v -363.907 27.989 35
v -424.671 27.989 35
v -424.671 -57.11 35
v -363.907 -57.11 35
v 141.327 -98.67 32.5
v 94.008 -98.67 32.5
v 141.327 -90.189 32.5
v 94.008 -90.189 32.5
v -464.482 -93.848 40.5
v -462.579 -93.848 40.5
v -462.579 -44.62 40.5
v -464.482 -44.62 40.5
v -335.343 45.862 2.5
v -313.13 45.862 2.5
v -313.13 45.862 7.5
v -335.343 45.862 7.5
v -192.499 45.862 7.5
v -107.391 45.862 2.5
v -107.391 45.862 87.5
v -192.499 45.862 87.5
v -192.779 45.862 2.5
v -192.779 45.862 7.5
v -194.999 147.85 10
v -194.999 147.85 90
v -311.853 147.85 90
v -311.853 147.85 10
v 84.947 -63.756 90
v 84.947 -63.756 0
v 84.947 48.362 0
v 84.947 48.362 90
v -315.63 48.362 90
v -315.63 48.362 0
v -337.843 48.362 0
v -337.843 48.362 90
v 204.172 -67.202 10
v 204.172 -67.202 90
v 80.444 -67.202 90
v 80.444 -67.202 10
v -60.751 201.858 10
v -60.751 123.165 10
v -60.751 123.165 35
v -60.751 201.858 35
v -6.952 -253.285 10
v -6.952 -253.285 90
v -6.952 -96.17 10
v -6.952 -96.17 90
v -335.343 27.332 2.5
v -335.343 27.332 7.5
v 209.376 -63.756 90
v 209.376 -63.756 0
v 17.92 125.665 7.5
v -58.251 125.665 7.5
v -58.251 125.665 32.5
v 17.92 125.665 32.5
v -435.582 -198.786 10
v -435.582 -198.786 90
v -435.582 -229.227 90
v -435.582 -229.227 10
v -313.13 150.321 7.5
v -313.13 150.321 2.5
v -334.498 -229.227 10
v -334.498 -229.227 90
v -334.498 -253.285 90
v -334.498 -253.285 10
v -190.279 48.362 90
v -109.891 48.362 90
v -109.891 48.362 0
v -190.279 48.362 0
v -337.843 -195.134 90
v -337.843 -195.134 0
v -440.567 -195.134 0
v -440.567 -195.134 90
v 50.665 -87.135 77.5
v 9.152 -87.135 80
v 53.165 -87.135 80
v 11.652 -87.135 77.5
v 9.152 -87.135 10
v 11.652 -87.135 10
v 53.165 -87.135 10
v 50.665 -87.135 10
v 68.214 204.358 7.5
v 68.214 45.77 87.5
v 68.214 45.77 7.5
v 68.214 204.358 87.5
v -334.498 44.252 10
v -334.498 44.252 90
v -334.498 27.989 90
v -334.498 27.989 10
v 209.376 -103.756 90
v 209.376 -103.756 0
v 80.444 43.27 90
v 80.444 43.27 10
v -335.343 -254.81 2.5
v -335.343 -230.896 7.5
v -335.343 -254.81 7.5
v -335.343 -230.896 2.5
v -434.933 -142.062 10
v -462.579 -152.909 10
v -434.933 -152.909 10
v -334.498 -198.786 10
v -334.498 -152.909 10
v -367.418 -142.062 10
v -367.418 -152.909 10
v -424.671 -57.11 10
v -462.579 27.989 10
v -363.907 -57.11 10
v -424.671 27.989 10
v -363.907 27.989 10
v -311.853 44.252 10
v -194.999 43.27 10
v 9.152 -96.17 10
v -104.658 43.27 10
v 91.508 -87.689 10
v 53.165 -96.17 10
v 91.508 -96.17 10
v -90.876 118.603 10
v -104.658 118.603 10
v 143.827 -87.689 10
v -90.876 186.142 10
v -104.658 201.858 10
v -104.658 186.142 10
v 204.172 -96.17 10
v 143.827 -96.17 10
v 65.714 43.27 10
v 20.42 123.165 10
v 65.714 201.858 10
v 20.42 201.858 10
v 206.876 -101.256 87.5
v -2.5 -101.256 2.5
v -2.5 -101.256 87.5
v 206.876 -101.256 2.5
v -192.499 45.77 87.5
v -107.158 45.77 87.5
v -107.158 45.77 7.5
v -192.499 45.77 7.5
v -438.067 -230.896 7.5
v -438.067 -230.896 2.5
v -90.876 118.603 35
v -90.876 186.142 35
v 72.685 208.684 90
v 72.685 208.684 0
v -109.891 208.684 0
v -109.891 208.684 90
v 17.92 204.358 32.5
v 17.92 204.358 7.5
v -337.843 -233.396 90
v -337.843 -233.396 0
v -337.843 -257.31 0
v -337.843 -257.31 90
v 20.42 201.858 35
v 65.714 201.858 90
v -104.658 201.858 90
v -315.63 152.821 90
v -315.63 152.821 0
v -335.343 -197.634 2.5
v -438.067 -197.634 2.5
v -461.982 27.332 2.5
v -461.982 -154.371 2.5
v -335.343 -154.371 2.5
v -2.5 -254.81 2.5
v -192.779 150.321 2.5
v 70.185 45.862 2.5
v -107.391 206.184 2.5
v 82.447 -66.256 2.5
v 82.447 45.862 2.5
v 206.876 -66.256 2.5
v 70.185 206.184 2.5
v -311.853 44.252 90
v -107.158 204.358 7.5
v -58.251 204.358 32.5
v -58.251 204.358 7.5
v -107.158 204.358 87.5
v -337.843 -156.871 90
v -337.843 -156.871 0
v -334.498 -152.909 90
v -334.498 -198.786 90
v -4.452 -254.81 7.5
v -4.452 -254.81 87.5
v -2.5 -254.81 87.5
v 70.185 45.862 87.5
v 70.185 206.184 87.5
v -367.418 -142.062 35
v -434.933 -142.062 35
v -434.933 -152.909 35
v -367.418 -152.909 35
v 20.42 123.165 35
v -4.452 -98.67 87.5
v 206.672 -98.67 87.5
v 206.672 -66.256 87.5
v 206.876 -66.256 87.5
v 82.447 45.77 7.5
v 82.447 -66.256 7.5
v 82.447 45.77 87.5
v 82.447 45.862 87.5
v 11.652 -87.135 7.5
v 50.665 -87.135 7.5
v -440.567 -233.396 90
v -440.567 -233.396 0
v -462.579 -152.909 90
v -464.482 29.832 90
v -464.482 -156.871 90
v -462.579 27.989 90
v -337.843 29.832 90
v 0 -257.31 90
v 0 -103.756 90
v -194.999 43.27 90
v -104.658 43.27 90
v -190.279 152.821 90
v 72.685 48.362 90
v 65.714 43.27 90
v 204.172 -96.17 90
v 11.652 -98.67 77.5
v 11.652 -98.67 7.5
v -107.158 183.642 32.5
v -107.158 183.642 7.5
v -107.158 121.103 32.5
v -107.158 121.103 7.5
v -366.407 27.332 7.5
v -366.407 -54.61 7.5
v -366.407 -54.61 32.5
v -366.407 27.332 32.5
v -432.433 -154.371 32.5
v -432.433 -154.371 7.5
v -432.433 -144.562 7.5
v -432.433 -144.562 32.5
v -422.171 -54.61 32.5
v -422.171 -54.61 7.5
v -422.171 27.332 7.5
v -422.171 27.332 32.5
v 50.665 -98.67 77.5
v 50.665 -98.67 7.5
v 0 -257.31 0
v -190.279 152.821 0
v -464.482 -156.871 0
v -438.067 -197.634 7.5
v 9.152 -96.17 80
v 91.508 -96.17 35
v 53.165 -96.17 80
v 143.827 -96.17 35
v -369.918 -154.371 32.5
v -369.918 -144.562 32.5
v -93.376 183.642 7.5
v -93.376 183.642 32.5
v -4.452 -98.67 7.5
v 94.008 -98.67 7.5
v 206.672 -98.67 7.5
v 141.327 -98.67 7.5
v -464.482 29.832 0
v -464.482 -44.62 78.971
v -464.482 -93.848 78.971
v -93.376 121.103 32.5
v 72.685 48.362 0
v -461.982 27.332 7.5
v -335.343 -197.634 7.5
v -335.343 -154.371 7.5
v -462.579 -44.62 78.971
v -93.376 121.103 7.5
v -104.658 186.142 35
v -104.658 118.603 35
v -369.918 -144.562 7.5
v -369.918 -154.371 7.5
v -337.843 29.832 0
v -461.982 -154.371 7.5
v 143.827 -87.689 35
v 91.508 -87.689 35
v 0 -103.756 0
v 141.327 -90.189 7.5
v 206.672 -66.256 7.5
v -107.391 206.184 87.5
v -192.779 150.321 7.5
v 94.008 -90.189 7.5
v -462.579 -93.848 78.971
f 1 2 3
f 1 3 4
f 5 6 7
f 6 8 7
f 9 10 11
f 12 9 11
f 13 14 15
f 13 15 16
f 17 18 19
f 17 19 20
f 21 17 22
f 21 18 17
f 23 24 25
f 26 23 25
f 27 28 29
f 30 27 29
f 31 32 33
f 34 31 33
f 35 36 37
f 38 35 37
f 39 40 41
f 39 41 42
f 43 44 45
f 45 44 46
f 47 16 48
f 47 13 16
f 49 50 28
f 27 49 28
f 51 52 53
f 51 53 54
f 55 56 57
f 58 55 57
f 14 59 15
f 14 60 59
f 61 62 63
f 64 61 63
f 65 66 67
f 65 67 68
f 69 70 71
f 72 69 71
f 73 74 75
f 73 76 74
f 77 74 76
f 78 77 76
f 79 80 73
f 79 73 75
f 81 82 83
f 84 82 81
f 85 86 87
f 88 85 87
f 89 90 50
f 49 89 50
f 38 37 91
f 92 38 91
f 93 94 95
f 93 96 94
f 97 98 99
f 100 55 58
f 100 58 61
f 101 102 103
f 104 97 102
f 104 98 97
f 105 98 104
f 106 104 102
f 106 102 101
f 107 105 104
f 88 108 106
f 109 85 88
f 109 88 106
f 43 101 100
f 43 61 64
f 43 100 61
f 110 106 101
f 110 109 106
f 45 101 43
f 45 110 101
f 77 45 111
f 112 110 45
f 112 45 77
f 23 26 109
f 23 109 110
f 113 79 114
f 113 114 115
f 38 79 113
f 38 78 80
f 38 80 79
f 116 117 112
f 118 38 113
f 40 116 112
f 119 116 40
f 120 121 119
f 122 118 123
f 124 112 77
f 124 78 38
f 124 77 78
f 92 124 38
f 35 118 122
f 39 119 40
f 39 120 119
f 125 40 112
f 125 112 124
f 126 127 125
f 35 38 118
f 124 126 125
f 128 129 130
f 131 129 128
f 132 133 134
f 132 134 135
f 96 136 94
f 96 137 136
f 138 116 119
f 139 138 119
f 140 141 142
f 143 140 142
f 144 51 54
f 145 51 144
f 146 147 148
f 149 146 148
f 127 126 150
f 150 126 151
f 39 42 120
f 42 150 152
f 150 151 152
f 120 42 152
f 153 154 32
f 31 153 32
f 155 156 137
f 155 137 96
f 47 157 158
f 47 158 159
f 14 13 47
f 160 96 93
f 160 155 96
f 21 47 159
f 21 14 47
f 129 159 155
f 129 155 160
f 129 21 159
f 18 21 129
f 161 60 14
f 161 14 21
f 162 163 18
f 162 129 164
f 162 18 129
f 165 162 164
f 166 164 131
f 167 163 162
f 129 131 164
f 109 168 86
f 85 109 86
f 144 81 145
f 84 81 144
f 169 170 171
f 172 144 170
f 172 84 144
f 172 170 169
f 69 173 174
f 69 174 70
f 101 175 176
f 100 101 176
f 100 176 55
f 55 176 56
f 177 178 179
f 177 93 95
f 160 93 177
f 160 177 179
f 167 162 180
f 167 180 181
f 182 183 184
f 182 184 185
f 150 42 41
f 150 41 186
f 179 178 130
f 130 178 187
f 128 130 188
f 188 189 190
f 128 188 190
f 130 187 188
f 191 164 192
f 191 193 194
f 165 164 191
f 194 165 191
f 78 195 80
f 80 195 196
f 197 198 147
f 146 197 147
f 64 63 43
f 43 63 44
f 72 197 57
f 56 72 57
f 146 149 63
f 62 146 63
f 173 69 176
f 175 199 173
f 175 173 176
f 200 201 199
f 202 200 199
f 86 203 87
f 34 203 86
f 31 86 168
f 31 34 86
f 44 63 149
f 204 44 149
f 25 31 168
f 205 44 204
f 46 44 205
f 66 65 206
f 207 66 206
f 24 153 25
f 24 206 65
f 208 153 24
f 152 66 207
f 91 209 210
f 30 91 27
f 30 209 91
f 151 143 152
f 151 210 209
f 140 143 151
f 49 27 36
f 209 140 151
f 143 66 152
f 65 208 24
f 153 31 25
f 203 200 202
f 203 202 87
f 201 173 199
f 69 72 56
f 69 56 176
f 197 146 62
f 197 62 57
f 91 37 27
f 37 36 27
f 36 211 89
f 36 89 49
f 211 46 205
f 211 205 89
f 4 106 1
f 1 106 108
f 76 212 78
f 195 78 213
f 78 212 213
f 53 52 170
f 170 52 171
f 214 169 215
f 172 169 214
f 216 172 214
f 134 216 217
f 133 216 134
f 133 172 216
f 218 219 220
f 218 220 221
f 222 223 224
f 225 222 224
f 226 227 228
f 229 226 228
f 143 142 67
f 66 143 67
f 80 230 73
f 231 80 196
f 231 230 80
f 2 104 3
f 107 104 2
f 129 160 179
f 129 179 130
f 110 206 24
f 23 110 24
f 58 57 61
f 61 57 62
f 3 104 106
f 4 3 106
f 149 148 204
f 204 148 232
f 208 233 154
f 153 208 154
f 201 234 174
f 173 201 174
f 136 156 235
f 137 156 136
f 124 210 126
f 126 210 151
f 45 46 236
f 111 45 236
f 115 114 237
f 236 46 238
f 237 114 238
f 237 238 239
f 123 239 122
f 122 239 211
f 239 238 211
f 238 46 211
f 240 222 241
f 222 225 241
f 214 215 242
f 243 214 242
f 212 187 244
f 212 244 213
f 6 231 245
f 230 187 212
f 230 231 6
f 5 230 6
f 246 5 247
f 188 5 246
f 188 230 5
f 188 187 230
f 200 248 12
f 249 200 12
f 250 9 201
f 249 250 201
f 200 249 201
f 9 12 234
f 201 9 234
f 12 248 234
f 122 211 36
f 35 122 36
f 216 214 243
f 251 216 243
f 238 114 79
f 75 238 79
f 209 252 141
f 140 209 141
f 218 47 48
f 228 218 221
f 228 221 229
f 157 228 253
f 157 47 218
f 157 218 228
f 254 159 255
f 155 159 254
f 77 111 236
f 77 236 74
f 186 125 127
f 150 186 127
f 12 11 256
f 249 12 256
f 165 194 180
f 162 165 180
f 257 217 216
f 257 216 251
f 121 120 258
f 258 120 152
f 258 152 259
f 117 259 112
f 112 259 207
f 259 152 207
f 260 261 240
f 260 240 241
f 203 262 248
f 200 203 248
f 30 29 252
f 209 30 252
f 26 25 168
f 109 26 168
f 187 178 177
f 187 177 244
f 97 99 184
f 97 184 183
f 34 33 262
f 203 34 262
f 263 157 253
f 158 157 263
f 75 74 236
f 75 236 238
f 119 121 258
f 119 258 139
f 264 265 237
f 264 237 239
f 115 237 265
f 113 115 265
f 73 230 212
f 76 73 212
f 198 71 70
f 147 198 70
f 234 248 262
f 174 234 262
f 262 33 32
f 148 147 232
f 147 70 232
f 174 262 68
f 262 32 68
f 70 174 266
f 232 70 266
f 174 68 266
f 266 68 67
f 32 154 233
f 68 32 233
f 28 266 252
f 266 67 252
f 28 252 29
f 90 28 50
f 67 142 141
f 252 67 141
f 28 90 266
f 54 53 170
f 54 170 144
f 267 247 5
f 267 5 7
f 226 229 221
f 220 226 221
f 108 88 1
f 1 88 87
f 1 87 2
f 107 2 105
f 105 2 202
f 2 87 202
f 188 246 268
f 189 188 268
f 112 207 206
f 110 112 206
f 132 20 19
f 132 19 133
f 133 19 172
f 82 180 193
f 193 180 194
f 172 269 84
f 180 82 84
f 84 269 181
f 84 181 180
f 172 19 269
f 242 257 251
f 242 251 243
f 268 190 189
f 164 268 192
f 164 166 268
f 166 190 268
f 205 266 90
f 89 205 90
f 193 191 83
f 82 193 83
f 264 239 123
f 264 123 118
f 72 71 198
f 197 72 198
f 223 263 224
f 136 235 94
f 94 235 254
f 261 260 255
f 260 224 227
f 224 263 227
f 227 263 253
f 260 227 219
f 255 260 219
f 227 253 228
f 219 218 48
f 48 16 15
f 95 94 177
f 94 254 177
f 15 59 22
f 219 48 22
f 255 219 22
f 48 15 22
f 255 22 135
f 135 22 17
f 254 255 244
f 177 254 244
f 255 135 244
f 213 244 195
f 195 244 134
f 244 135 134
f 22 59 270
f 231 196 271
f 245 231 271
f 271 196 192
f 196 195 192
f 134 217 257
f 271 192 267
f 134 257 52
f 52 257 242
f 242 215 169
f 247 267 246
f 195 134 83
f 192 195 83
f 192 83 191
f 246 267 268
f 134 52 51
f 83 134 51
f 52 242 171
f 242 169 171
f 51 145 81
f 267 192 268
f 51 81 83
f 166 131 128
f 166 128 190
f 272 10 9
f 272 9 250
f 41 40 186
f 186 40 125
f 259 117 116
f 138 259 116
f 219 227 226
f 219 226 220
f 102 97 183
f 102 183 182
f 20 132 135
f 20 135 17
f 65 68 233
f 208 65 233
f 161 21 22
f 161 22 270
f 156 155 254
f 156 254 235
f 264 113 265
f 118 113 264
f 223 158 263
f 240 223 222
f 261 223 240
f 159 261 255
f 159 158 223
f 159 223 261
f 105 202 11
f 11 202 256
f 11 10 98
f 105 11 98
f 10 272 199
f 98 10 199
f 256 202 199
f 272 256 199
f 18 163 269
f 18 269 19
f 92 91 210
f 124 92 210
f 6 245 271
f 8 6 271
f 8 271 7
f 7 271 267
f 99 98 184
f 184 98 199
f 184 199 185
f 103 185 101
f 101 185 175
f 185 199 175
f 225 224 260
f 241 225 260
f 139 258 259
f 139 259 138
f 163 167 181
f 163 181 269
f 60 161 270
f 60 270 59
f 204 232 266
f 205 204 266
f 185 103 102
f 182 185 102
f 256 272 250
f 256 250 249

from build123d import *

# Parameters (mm, degrees)
F1_DEPTH  = 90
F3_DEPTH  = 80
F14_W     = 60.7640445232
F14_H     = 85.0984491408
F14_W_2   = 67.515194416
F14_H_2   = 10.8465999365
F15_DEPTH = 25
F16_W     = 49.2283031344
F16_H     = 38.4706258774
F17_DEPTH = 25
F18_W     = 81.171695143
F18_H     = 78.6929726601
F18_W_2   = 13.7816295028
F18_H_2   = 67.5387531519
F19_DEPTH = 25
F20_W     = 44.0124189481
F20_H     = 9.0348646045
F21_DEPTH = 70
F22_W     = 52.3186028004
F22_H     = 8.4803402424
F23_DEPTH = 25
F24_T     = -2.5


# Not quite as in the source:
# - a shell that OpenCascade refuses in one call is made with other operations: the cavity is built on its own and cut out
# - the program builds the solid bodies; features that only make, move or delete a surface that nothing else refers to are left out


with BuildPart() as f1:
    # F0 (on Top) → F1 (new body)
    with BuildSketch(Plane.XY):
        Polygon((0, -103.756165579), (61.2453594729, -103.756165579), (209.3763612108, -103.756165579), (209.3763612108, -63.756165579), (84.9471986294, -63.756165579), (84.9471986294, 48.3620613813), (72.6846382022, 48.3620613813), (72.6846382022, 208.6838036776), (-109.8914146423, 208.6838036776), (-109.8914146423, 48.3620613813), (-190.279379487, 48.3620613813), (-190.279379487, 152.8209894896), (-315.6301081181, 152.8209894896), (-315.6301081181, 48.3620613813), (-337.8433585167, 48.3620613813), (-337.8433585167, 29.8324227333), (-464.4817113876, 29.8324227333), (-464.4817113876, -156.8707674742), (-337.8433585167, -156.8707674742), (-337.8433585167, -195.1335072517), (-440.5674934387, -195.1335072517), (-440.5674934387, -233.3962619305), (-337.8433585167, -233.3962619305), (-337.8433585167, -257.3104500771), (0, -257.3104500771), align=None)
    extrude(amount=F1_DEPTH)

    # F2 (on face) → F3 (cut)
    with BuildSketch(Plane.XY.offset(90)):
        Polygon((-334.4984054565, 27.9887765646), (-462.5793099403, 27.9887765646), (-462.5793099403, -152.908667922), (-334.4984054565, -152.908667922), (-334.4984054565, -198.7856328487), (-435.5817735195, -198.7856328487), (-435.5817735195, -229.2267084122), (-334.4984054565, -229.2267084122), (-334.4984054565, -253.2849907875), (-6.9517553784, -253.2849907875), (-6.9517553784, -96.1697399616), (204.1718363762, -96.1697399616), (204.1718363762, -67.2016069293), (80.44359833, -67.2016069293), (80.44359833, 43.2700514793), (65.7140463591, 43.2700514793), (65.7140463591, 201.8582522869), (-104.6577990055, 201.8582522869), (-104.6577990055, 43.2700552046), (-194.9990689754, 43.2700552046), (-194.9990689754, 147.8498876095), (-311.8534982204, 147.8498876095), (-311.8534982204, 44.2520268261), (-334.4984054565, 44.2520268261), align=None)
    extrude(amount=-F3_DEPTH, mode=Mode.SUBTRACT)

    # F14 (on face) → F15 (join)
    with BuildSketch(Plane.XY.offset(10)):
        with Locations((-394.2892104387, -14.5604480058)):
            Rectangle(F14_W, F14_H)
        with Locations((-401.1757969856, -147.4853679538)):
            Rectangle(F14_W_2, F14_H_2)
    extrude(amount=F15_DEPTH)

    # F16 (on face) → F17 (cut)
    with BuildSketch(Plane.YZ.offset(-462.5793099403)):
        with Locations((-69.2342929542, 59.7355216742)):
            Rectangle(F16_W, F16_H)
    extrude(amount=-F17_DEPTH, mode=Mode.SUBTRACT)

    # F18 (on face) → F19 (join)
    with BuildSketch(Plane.XY.offset(10)):
        with Locations((-20.1654676348, 162.5117659569)):
            Rectangle(F18_W, F18_H)
        with Locations((-97.7669842541, 152.3723676801)):
            Rectangle(F18_W_2, F18_H_2)
    extrude(amount=F19_DEPTH)

    # F20 (on face) → F21 (join)
    with BuildSketch(Plane.XY.offset(10)):
        with Locations((31.1586786993, -91.6523076594)):
            Rectangle(F20_W, F20_H)
    extrude(amount=F21_DEPTH)

    # F22 (on face) → F23 (join)
    with BuildSketch(Plane.XY.offset(10)):
        with Locations((117.6677644253, -91.9295698404)):
            Rectangle(F22_W, F22_H)
    extrude(amount=F23_DEPTH)

    # F24: a shell. OpenCascade refuses it in one call, so the cavity is built on its own and cut out:
    # the body offset inwards by the wall thickness, plus a prism from it out through each open face.
    f24_core = offset(f1.part, amount=F24_T, kind=Kind.INTERSECTION, mode=Mode.PRIVATE)
    f24_exits = [f24_core.faces().sort_by_distance(p)[0] for p in [
        (31.158679, -89.634875, 42.5),
    ]]
    add(f24_core, mode=Mode.SUBTRACT)
    extrude(f24_exits, amount=-F24_T, mode=Mode.SUBTRACT)


solid = f1.part
